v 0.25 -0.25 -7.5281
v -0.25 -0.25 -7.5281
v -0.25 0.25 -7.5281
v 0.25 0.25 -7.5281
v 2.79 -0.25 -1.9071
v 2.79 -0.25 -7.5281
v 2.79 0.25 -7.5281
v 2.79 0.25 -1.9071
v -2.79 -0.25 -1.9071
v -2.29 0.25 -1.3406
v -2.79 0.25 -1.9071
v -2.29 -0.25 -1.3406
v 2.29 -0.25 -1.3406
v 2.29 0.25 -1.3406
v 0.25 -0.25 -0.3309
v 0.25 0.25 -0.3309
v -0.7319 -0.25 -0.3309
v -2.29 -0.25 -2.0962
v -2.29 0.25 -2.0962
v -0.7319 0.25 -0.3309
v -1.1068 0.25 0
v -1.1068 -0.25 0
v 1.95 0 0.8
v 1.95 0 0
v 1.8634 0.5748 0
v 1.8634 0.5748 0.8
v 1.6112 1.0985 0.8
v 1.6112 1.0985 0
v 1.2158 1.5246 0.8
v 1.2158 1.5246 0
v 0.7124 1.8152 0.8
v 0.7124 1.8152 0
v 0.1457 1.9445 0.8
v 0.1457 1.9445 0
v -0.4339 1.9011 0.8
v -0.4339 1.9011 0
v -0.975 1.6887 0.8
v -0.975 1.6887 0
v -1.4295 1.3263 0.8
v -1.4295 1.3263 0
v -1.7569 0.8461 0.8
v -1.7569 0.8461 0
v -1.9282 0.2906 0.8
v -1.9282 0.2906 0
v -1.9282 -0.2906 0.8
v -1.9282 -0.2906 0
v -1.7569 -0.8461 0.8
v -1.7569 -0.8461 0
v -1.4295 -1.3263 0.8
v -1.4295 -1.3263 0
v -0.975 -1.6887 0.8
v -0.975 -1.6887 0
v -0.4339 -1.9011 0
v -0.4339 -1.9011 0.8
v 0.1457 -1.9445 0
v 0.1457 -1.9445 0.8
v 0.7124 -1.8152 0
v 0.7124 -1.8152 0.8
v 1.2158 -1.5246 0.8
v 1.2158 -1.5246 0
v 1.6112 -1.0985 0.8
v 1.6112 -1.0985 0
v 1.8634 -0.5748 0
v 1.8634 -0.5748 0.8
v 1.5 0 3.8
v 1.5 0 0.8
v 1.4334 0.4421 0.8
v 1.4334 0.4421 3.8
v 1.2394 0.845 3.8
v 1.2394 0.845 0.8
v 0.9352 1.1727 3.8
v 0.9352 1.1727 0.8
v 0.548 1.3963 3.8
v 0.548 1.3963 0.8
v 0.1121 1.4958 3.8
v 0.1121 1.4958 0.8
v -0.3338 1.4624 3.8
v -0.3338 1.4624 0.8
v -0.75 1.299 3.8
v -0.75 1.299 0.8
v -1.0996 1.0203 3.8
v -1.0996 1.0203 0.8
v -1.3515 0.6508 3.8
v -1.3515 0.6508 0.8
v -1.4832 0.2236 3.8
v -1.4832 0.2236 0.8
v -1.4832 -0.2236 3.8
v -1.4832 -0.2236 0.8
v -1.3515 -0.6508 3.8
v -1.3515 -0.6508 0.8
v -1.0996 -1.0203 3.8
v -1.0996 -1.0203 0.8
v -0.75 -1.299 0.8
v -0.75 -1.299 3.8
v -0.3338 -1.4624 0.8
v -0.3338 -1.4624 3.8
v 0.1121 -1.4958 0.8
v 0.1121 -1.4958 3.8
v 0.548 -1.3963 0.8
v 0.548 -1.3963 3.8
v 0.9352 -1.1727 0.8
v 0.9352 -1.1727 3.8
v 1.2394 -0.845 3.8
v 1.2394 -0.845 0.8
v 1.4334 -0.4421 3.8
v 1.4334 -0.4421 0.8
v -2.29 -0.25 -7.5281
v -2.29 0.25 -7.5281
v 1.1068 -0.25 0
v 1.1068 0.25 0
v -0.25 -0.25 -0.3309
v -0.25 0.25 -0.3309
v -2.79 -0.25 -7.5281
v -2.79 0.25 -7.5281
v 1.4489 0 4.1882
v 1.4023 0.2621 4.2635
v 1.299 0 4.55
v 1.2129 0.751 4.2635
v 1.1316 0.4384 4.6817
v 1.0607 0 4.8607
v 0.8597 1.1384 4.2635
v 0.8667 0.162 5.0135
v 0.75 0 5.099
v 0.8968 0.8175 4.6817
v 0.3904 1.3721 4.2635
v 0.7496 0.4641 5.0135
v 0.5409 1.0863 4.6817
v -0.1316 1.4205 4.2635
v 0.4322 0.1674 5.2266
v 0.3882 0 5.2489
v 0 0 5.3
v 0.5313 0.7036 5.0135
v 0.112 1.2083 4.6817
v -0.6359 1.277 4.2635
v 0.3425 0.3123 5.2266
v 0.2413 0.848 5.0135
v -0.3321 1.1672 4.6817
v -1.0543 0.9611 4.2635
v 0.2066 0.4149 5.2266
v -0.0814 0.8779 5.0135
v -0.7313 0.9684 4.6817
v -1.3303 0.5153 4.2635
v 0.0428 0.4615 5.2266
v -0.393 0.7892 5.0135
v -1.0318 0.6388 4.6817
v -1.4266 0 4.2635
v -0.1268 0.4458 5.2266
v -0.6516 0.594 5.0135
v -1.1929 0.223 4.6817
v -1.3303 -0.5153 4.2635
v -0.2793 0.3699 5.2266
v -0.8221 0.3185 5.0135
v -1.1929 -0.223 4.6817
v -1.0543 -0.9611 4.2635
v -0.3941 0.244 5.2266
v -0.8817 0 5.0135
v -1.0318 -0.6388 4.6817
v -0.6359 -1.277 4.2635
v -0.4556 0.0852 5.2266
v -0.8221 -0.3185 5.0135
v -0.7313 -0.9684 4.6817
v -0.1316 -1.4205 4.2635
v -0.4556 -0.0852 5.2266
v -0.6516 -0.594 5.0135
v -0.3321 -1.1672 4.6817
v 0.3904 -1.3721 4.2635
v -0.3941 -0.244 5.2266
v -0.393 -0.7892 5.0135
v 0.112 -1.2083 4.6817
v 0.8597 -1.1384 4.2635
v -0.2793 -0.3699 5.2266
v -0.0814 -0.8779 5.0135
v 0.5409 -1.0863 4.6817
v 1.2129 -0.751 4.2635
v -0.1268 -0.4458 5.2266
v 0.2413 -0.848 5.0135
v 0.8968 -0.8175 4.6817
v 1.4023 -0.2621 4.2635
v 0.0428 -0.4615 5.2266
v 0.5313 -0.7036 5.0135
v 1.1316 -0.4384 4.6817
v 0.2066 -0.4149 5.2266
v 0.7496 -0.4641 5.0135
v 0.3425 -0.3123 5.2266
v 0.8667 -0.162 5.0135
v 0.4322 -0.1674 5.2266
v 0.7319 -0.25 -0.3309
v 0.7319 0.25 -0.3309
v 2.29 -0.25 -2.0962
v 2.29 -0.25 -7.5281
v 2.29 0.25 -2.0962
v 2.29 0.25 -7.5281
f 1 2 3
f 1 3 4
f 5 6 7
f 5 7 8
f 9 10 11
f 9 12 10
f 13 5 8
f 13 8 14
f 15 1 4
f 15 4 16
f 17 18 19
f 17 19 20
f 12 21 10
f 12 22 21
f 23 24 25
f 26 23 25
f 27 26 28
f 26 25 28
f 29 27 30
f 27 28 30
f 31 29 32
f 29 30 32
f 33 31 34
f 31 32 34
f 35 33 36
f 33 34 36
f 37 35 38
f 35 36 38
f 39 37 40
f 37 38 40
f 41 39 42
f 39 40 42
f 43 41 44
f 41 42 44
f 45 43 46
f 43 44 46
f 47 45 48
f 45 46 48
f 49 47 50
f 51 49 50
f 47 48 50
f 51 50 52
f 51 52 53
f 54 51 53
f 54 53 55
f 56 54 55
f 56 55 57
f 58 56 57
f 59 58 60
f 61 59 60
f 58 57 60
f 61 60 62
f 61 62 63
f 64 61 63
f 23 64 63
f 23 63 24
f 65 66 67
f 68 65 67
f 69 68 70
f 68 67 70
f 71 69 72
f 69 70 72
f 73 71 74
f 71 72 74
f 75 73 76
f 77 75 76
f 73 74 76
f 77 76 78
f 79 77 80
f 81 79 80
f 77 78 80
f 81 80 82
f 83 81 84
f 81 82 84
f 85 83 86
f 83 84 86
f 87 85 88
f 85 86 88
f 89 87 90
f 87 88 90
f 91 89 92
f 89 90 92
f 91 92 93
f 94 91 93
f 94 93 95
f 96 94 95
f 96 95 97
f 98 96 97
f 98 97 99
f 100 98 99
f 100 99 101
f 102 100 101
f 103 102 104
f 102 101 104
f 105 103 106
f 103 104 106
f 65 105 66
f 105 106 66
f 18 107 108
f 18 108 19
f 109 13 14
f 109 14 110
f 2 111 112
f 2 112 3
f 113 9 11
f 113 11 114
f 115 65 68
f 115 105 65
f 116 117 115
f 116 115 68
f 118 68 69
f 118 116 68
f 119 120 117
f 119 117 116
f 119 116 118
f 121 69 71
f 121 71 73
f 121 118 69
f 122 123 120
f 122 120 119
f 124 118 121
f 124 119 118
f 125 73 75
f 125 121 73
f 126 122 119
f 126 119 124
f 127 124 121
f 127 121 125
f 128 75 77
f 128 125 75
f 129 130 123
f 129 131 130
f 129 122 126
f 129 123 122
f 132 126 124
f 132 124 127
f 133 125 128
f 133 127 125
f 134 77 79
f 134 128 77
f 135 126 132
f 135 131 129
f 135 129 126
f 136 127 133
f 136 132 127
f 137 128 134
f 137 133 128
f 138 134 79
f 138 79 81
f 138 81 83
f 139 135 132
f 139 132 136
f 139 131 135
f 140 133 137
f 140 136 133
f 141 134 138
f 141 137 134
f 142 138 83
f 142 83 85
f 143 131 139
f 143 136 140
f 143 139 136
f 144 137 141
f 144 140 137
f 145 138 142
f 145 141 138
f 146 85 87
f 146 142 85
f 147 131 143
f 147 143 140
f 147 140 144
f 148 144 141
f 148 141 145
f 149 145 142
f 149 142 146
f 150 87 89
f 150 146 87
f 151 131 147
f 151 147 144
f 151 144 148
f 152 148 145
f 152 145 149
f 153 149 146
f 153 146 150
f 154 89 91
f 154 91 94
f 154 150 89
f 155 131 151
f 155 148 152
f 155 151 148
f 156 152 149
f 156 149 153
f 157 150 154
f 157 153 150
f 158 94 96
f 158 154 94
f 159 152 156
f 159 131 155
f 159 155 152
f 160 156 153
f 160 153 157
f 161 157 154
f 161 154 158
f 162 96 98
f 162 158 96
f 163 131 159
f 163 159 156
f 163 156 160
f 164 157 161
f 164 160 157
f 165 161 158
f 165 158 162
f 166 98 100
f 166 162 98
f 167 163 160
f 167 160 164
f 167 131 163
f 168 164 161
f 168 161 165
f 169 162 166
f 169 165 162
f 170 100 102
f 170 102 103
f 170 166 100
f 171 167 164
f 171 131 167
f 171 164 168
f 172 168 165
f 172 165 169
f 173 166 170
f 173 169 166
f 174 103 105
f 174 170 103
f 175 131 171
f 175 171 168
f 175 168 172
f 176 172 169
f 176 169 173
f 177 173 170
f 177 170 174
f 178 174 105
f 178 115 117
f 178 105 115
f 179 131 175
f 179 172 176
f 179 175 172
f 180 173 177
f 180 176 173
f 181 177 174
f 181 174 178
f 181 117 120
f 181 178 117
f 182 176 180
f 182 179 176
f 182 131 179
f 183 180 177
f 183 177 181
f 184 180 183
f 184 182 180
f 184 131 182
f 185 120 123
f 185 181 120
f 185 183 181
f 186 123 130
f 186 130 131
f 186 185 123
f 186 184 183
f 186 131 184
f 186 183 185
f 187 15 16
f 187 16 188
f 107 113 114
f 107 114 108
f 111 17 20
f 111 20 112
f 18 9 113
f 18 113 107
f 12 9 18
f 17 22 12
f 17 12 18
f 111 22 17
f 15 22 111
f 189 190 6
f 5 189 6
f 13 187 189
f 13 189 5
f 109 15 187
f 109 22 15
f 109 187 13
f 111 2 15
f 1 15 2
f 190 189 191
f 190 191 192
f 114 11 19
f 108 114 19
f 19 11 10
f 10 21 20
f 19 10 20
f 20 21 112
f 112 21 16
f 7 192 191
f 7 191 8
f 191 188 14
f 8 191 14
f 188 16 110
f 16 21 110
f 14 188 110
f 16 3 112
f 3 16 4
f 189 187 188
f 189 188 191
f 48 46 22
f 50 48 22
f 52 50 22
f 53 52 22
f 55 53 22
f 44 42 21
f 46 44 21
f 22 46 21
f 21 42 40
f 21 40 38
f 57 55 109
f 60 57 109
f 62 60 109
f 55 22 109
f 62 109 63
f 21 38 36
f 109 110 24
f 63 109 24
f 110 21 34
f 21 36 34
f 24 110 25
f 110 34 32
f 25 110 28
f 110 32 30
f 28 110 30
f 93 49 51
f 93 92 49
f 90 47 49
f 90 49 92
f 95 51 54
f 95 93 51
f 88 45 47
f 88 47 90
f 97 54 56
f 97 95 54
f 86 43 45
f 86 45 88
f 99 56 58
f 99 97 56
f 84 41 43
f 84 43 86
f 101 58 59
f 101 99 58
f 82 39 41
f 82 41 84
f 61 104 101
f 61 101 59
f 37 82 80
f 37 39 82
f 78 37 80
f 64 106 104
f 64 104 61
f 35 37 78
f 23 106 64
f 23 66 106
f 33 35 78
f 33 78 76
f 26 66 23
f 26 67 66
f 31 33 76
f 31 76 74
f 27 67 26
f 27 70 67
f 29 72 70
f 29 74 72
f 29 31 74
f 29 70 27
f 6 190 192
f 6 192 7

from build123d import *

# Parameters (mm, degrees)
F0_R          = 1.95
F1_DEPTH      = 0.8
F2_R          = 1.5
F3_DEPTH      = 4.5
F4_R          = 1.5
F6_DEPTH      = 0.25
F6_DEPTH_BACK = 0.25


with BuildPart() as f1:
    # F0 (on Top) → F1 (new body)
    with BuildSketch(Plane.XY):
        Circle(F0_R)
    extrude(amount=F1_DEPTH)

    # F2 (on face) → F3 (join)
    with BuildSketch(Plane.XY.offset(0.8)):
        Circle(F2_R)
    extrude(amount=F3_DEPTH)

    # F4
    f4_edges = [f1.edges().sort_by_distance(p)[0] for p in [
        (-1.5, 0, 5.3),
    ]]
    fillet(f4_edges, radius=F4_R)

    # F5 (on Front) → F6 (join, two sides)
    with BuildSketch(Plane.XZ) as f6_sk:
        Polygon((-2.29, -1.340597), (-2.54, -1.623856), (-2.54, -7.528054), (-2.29, -7.528054), (-2.29, -2.096204), align=None)
        Polygon((-2.54, -7.528054), (-2.54, -1.623856), (-2.79, -1.907115), (-2.79, -7.528054), align=None)
        Polygon((-1.106809, 0), (-2.29, -1.340597), (-2.29, -2.096204), (-0.731933, -0.33086), (-0.25, -0.33086), (0.25, -0.33086), (0.731933, -0.33086), (2.29, -2.096204), (2.29, -1.340597), (1.106809, 0), align=None)
        Polygon((0.25, -0.33086), (-0.25, -0.33086), (-0.25, -7.528054), (0, -7.528054), (0.25, -7.528054), align=None)
        Polygon((2.54, -1.623856), (2.29, -1.340597), (2.29, -2.096204), (2.29, -7.528054), (2.54, -7.528054), align=None)
        Polygon((2.79, -1.907115), (2.54, -1.623856), (2.54, -7.528054), (2.79, -7.528054), align=None)
    extrude(amount=F6_DEPTH)
    extrude(f6_sk.sketch, amount=-F6_DEPTH_BACK)


solid = f1.part
